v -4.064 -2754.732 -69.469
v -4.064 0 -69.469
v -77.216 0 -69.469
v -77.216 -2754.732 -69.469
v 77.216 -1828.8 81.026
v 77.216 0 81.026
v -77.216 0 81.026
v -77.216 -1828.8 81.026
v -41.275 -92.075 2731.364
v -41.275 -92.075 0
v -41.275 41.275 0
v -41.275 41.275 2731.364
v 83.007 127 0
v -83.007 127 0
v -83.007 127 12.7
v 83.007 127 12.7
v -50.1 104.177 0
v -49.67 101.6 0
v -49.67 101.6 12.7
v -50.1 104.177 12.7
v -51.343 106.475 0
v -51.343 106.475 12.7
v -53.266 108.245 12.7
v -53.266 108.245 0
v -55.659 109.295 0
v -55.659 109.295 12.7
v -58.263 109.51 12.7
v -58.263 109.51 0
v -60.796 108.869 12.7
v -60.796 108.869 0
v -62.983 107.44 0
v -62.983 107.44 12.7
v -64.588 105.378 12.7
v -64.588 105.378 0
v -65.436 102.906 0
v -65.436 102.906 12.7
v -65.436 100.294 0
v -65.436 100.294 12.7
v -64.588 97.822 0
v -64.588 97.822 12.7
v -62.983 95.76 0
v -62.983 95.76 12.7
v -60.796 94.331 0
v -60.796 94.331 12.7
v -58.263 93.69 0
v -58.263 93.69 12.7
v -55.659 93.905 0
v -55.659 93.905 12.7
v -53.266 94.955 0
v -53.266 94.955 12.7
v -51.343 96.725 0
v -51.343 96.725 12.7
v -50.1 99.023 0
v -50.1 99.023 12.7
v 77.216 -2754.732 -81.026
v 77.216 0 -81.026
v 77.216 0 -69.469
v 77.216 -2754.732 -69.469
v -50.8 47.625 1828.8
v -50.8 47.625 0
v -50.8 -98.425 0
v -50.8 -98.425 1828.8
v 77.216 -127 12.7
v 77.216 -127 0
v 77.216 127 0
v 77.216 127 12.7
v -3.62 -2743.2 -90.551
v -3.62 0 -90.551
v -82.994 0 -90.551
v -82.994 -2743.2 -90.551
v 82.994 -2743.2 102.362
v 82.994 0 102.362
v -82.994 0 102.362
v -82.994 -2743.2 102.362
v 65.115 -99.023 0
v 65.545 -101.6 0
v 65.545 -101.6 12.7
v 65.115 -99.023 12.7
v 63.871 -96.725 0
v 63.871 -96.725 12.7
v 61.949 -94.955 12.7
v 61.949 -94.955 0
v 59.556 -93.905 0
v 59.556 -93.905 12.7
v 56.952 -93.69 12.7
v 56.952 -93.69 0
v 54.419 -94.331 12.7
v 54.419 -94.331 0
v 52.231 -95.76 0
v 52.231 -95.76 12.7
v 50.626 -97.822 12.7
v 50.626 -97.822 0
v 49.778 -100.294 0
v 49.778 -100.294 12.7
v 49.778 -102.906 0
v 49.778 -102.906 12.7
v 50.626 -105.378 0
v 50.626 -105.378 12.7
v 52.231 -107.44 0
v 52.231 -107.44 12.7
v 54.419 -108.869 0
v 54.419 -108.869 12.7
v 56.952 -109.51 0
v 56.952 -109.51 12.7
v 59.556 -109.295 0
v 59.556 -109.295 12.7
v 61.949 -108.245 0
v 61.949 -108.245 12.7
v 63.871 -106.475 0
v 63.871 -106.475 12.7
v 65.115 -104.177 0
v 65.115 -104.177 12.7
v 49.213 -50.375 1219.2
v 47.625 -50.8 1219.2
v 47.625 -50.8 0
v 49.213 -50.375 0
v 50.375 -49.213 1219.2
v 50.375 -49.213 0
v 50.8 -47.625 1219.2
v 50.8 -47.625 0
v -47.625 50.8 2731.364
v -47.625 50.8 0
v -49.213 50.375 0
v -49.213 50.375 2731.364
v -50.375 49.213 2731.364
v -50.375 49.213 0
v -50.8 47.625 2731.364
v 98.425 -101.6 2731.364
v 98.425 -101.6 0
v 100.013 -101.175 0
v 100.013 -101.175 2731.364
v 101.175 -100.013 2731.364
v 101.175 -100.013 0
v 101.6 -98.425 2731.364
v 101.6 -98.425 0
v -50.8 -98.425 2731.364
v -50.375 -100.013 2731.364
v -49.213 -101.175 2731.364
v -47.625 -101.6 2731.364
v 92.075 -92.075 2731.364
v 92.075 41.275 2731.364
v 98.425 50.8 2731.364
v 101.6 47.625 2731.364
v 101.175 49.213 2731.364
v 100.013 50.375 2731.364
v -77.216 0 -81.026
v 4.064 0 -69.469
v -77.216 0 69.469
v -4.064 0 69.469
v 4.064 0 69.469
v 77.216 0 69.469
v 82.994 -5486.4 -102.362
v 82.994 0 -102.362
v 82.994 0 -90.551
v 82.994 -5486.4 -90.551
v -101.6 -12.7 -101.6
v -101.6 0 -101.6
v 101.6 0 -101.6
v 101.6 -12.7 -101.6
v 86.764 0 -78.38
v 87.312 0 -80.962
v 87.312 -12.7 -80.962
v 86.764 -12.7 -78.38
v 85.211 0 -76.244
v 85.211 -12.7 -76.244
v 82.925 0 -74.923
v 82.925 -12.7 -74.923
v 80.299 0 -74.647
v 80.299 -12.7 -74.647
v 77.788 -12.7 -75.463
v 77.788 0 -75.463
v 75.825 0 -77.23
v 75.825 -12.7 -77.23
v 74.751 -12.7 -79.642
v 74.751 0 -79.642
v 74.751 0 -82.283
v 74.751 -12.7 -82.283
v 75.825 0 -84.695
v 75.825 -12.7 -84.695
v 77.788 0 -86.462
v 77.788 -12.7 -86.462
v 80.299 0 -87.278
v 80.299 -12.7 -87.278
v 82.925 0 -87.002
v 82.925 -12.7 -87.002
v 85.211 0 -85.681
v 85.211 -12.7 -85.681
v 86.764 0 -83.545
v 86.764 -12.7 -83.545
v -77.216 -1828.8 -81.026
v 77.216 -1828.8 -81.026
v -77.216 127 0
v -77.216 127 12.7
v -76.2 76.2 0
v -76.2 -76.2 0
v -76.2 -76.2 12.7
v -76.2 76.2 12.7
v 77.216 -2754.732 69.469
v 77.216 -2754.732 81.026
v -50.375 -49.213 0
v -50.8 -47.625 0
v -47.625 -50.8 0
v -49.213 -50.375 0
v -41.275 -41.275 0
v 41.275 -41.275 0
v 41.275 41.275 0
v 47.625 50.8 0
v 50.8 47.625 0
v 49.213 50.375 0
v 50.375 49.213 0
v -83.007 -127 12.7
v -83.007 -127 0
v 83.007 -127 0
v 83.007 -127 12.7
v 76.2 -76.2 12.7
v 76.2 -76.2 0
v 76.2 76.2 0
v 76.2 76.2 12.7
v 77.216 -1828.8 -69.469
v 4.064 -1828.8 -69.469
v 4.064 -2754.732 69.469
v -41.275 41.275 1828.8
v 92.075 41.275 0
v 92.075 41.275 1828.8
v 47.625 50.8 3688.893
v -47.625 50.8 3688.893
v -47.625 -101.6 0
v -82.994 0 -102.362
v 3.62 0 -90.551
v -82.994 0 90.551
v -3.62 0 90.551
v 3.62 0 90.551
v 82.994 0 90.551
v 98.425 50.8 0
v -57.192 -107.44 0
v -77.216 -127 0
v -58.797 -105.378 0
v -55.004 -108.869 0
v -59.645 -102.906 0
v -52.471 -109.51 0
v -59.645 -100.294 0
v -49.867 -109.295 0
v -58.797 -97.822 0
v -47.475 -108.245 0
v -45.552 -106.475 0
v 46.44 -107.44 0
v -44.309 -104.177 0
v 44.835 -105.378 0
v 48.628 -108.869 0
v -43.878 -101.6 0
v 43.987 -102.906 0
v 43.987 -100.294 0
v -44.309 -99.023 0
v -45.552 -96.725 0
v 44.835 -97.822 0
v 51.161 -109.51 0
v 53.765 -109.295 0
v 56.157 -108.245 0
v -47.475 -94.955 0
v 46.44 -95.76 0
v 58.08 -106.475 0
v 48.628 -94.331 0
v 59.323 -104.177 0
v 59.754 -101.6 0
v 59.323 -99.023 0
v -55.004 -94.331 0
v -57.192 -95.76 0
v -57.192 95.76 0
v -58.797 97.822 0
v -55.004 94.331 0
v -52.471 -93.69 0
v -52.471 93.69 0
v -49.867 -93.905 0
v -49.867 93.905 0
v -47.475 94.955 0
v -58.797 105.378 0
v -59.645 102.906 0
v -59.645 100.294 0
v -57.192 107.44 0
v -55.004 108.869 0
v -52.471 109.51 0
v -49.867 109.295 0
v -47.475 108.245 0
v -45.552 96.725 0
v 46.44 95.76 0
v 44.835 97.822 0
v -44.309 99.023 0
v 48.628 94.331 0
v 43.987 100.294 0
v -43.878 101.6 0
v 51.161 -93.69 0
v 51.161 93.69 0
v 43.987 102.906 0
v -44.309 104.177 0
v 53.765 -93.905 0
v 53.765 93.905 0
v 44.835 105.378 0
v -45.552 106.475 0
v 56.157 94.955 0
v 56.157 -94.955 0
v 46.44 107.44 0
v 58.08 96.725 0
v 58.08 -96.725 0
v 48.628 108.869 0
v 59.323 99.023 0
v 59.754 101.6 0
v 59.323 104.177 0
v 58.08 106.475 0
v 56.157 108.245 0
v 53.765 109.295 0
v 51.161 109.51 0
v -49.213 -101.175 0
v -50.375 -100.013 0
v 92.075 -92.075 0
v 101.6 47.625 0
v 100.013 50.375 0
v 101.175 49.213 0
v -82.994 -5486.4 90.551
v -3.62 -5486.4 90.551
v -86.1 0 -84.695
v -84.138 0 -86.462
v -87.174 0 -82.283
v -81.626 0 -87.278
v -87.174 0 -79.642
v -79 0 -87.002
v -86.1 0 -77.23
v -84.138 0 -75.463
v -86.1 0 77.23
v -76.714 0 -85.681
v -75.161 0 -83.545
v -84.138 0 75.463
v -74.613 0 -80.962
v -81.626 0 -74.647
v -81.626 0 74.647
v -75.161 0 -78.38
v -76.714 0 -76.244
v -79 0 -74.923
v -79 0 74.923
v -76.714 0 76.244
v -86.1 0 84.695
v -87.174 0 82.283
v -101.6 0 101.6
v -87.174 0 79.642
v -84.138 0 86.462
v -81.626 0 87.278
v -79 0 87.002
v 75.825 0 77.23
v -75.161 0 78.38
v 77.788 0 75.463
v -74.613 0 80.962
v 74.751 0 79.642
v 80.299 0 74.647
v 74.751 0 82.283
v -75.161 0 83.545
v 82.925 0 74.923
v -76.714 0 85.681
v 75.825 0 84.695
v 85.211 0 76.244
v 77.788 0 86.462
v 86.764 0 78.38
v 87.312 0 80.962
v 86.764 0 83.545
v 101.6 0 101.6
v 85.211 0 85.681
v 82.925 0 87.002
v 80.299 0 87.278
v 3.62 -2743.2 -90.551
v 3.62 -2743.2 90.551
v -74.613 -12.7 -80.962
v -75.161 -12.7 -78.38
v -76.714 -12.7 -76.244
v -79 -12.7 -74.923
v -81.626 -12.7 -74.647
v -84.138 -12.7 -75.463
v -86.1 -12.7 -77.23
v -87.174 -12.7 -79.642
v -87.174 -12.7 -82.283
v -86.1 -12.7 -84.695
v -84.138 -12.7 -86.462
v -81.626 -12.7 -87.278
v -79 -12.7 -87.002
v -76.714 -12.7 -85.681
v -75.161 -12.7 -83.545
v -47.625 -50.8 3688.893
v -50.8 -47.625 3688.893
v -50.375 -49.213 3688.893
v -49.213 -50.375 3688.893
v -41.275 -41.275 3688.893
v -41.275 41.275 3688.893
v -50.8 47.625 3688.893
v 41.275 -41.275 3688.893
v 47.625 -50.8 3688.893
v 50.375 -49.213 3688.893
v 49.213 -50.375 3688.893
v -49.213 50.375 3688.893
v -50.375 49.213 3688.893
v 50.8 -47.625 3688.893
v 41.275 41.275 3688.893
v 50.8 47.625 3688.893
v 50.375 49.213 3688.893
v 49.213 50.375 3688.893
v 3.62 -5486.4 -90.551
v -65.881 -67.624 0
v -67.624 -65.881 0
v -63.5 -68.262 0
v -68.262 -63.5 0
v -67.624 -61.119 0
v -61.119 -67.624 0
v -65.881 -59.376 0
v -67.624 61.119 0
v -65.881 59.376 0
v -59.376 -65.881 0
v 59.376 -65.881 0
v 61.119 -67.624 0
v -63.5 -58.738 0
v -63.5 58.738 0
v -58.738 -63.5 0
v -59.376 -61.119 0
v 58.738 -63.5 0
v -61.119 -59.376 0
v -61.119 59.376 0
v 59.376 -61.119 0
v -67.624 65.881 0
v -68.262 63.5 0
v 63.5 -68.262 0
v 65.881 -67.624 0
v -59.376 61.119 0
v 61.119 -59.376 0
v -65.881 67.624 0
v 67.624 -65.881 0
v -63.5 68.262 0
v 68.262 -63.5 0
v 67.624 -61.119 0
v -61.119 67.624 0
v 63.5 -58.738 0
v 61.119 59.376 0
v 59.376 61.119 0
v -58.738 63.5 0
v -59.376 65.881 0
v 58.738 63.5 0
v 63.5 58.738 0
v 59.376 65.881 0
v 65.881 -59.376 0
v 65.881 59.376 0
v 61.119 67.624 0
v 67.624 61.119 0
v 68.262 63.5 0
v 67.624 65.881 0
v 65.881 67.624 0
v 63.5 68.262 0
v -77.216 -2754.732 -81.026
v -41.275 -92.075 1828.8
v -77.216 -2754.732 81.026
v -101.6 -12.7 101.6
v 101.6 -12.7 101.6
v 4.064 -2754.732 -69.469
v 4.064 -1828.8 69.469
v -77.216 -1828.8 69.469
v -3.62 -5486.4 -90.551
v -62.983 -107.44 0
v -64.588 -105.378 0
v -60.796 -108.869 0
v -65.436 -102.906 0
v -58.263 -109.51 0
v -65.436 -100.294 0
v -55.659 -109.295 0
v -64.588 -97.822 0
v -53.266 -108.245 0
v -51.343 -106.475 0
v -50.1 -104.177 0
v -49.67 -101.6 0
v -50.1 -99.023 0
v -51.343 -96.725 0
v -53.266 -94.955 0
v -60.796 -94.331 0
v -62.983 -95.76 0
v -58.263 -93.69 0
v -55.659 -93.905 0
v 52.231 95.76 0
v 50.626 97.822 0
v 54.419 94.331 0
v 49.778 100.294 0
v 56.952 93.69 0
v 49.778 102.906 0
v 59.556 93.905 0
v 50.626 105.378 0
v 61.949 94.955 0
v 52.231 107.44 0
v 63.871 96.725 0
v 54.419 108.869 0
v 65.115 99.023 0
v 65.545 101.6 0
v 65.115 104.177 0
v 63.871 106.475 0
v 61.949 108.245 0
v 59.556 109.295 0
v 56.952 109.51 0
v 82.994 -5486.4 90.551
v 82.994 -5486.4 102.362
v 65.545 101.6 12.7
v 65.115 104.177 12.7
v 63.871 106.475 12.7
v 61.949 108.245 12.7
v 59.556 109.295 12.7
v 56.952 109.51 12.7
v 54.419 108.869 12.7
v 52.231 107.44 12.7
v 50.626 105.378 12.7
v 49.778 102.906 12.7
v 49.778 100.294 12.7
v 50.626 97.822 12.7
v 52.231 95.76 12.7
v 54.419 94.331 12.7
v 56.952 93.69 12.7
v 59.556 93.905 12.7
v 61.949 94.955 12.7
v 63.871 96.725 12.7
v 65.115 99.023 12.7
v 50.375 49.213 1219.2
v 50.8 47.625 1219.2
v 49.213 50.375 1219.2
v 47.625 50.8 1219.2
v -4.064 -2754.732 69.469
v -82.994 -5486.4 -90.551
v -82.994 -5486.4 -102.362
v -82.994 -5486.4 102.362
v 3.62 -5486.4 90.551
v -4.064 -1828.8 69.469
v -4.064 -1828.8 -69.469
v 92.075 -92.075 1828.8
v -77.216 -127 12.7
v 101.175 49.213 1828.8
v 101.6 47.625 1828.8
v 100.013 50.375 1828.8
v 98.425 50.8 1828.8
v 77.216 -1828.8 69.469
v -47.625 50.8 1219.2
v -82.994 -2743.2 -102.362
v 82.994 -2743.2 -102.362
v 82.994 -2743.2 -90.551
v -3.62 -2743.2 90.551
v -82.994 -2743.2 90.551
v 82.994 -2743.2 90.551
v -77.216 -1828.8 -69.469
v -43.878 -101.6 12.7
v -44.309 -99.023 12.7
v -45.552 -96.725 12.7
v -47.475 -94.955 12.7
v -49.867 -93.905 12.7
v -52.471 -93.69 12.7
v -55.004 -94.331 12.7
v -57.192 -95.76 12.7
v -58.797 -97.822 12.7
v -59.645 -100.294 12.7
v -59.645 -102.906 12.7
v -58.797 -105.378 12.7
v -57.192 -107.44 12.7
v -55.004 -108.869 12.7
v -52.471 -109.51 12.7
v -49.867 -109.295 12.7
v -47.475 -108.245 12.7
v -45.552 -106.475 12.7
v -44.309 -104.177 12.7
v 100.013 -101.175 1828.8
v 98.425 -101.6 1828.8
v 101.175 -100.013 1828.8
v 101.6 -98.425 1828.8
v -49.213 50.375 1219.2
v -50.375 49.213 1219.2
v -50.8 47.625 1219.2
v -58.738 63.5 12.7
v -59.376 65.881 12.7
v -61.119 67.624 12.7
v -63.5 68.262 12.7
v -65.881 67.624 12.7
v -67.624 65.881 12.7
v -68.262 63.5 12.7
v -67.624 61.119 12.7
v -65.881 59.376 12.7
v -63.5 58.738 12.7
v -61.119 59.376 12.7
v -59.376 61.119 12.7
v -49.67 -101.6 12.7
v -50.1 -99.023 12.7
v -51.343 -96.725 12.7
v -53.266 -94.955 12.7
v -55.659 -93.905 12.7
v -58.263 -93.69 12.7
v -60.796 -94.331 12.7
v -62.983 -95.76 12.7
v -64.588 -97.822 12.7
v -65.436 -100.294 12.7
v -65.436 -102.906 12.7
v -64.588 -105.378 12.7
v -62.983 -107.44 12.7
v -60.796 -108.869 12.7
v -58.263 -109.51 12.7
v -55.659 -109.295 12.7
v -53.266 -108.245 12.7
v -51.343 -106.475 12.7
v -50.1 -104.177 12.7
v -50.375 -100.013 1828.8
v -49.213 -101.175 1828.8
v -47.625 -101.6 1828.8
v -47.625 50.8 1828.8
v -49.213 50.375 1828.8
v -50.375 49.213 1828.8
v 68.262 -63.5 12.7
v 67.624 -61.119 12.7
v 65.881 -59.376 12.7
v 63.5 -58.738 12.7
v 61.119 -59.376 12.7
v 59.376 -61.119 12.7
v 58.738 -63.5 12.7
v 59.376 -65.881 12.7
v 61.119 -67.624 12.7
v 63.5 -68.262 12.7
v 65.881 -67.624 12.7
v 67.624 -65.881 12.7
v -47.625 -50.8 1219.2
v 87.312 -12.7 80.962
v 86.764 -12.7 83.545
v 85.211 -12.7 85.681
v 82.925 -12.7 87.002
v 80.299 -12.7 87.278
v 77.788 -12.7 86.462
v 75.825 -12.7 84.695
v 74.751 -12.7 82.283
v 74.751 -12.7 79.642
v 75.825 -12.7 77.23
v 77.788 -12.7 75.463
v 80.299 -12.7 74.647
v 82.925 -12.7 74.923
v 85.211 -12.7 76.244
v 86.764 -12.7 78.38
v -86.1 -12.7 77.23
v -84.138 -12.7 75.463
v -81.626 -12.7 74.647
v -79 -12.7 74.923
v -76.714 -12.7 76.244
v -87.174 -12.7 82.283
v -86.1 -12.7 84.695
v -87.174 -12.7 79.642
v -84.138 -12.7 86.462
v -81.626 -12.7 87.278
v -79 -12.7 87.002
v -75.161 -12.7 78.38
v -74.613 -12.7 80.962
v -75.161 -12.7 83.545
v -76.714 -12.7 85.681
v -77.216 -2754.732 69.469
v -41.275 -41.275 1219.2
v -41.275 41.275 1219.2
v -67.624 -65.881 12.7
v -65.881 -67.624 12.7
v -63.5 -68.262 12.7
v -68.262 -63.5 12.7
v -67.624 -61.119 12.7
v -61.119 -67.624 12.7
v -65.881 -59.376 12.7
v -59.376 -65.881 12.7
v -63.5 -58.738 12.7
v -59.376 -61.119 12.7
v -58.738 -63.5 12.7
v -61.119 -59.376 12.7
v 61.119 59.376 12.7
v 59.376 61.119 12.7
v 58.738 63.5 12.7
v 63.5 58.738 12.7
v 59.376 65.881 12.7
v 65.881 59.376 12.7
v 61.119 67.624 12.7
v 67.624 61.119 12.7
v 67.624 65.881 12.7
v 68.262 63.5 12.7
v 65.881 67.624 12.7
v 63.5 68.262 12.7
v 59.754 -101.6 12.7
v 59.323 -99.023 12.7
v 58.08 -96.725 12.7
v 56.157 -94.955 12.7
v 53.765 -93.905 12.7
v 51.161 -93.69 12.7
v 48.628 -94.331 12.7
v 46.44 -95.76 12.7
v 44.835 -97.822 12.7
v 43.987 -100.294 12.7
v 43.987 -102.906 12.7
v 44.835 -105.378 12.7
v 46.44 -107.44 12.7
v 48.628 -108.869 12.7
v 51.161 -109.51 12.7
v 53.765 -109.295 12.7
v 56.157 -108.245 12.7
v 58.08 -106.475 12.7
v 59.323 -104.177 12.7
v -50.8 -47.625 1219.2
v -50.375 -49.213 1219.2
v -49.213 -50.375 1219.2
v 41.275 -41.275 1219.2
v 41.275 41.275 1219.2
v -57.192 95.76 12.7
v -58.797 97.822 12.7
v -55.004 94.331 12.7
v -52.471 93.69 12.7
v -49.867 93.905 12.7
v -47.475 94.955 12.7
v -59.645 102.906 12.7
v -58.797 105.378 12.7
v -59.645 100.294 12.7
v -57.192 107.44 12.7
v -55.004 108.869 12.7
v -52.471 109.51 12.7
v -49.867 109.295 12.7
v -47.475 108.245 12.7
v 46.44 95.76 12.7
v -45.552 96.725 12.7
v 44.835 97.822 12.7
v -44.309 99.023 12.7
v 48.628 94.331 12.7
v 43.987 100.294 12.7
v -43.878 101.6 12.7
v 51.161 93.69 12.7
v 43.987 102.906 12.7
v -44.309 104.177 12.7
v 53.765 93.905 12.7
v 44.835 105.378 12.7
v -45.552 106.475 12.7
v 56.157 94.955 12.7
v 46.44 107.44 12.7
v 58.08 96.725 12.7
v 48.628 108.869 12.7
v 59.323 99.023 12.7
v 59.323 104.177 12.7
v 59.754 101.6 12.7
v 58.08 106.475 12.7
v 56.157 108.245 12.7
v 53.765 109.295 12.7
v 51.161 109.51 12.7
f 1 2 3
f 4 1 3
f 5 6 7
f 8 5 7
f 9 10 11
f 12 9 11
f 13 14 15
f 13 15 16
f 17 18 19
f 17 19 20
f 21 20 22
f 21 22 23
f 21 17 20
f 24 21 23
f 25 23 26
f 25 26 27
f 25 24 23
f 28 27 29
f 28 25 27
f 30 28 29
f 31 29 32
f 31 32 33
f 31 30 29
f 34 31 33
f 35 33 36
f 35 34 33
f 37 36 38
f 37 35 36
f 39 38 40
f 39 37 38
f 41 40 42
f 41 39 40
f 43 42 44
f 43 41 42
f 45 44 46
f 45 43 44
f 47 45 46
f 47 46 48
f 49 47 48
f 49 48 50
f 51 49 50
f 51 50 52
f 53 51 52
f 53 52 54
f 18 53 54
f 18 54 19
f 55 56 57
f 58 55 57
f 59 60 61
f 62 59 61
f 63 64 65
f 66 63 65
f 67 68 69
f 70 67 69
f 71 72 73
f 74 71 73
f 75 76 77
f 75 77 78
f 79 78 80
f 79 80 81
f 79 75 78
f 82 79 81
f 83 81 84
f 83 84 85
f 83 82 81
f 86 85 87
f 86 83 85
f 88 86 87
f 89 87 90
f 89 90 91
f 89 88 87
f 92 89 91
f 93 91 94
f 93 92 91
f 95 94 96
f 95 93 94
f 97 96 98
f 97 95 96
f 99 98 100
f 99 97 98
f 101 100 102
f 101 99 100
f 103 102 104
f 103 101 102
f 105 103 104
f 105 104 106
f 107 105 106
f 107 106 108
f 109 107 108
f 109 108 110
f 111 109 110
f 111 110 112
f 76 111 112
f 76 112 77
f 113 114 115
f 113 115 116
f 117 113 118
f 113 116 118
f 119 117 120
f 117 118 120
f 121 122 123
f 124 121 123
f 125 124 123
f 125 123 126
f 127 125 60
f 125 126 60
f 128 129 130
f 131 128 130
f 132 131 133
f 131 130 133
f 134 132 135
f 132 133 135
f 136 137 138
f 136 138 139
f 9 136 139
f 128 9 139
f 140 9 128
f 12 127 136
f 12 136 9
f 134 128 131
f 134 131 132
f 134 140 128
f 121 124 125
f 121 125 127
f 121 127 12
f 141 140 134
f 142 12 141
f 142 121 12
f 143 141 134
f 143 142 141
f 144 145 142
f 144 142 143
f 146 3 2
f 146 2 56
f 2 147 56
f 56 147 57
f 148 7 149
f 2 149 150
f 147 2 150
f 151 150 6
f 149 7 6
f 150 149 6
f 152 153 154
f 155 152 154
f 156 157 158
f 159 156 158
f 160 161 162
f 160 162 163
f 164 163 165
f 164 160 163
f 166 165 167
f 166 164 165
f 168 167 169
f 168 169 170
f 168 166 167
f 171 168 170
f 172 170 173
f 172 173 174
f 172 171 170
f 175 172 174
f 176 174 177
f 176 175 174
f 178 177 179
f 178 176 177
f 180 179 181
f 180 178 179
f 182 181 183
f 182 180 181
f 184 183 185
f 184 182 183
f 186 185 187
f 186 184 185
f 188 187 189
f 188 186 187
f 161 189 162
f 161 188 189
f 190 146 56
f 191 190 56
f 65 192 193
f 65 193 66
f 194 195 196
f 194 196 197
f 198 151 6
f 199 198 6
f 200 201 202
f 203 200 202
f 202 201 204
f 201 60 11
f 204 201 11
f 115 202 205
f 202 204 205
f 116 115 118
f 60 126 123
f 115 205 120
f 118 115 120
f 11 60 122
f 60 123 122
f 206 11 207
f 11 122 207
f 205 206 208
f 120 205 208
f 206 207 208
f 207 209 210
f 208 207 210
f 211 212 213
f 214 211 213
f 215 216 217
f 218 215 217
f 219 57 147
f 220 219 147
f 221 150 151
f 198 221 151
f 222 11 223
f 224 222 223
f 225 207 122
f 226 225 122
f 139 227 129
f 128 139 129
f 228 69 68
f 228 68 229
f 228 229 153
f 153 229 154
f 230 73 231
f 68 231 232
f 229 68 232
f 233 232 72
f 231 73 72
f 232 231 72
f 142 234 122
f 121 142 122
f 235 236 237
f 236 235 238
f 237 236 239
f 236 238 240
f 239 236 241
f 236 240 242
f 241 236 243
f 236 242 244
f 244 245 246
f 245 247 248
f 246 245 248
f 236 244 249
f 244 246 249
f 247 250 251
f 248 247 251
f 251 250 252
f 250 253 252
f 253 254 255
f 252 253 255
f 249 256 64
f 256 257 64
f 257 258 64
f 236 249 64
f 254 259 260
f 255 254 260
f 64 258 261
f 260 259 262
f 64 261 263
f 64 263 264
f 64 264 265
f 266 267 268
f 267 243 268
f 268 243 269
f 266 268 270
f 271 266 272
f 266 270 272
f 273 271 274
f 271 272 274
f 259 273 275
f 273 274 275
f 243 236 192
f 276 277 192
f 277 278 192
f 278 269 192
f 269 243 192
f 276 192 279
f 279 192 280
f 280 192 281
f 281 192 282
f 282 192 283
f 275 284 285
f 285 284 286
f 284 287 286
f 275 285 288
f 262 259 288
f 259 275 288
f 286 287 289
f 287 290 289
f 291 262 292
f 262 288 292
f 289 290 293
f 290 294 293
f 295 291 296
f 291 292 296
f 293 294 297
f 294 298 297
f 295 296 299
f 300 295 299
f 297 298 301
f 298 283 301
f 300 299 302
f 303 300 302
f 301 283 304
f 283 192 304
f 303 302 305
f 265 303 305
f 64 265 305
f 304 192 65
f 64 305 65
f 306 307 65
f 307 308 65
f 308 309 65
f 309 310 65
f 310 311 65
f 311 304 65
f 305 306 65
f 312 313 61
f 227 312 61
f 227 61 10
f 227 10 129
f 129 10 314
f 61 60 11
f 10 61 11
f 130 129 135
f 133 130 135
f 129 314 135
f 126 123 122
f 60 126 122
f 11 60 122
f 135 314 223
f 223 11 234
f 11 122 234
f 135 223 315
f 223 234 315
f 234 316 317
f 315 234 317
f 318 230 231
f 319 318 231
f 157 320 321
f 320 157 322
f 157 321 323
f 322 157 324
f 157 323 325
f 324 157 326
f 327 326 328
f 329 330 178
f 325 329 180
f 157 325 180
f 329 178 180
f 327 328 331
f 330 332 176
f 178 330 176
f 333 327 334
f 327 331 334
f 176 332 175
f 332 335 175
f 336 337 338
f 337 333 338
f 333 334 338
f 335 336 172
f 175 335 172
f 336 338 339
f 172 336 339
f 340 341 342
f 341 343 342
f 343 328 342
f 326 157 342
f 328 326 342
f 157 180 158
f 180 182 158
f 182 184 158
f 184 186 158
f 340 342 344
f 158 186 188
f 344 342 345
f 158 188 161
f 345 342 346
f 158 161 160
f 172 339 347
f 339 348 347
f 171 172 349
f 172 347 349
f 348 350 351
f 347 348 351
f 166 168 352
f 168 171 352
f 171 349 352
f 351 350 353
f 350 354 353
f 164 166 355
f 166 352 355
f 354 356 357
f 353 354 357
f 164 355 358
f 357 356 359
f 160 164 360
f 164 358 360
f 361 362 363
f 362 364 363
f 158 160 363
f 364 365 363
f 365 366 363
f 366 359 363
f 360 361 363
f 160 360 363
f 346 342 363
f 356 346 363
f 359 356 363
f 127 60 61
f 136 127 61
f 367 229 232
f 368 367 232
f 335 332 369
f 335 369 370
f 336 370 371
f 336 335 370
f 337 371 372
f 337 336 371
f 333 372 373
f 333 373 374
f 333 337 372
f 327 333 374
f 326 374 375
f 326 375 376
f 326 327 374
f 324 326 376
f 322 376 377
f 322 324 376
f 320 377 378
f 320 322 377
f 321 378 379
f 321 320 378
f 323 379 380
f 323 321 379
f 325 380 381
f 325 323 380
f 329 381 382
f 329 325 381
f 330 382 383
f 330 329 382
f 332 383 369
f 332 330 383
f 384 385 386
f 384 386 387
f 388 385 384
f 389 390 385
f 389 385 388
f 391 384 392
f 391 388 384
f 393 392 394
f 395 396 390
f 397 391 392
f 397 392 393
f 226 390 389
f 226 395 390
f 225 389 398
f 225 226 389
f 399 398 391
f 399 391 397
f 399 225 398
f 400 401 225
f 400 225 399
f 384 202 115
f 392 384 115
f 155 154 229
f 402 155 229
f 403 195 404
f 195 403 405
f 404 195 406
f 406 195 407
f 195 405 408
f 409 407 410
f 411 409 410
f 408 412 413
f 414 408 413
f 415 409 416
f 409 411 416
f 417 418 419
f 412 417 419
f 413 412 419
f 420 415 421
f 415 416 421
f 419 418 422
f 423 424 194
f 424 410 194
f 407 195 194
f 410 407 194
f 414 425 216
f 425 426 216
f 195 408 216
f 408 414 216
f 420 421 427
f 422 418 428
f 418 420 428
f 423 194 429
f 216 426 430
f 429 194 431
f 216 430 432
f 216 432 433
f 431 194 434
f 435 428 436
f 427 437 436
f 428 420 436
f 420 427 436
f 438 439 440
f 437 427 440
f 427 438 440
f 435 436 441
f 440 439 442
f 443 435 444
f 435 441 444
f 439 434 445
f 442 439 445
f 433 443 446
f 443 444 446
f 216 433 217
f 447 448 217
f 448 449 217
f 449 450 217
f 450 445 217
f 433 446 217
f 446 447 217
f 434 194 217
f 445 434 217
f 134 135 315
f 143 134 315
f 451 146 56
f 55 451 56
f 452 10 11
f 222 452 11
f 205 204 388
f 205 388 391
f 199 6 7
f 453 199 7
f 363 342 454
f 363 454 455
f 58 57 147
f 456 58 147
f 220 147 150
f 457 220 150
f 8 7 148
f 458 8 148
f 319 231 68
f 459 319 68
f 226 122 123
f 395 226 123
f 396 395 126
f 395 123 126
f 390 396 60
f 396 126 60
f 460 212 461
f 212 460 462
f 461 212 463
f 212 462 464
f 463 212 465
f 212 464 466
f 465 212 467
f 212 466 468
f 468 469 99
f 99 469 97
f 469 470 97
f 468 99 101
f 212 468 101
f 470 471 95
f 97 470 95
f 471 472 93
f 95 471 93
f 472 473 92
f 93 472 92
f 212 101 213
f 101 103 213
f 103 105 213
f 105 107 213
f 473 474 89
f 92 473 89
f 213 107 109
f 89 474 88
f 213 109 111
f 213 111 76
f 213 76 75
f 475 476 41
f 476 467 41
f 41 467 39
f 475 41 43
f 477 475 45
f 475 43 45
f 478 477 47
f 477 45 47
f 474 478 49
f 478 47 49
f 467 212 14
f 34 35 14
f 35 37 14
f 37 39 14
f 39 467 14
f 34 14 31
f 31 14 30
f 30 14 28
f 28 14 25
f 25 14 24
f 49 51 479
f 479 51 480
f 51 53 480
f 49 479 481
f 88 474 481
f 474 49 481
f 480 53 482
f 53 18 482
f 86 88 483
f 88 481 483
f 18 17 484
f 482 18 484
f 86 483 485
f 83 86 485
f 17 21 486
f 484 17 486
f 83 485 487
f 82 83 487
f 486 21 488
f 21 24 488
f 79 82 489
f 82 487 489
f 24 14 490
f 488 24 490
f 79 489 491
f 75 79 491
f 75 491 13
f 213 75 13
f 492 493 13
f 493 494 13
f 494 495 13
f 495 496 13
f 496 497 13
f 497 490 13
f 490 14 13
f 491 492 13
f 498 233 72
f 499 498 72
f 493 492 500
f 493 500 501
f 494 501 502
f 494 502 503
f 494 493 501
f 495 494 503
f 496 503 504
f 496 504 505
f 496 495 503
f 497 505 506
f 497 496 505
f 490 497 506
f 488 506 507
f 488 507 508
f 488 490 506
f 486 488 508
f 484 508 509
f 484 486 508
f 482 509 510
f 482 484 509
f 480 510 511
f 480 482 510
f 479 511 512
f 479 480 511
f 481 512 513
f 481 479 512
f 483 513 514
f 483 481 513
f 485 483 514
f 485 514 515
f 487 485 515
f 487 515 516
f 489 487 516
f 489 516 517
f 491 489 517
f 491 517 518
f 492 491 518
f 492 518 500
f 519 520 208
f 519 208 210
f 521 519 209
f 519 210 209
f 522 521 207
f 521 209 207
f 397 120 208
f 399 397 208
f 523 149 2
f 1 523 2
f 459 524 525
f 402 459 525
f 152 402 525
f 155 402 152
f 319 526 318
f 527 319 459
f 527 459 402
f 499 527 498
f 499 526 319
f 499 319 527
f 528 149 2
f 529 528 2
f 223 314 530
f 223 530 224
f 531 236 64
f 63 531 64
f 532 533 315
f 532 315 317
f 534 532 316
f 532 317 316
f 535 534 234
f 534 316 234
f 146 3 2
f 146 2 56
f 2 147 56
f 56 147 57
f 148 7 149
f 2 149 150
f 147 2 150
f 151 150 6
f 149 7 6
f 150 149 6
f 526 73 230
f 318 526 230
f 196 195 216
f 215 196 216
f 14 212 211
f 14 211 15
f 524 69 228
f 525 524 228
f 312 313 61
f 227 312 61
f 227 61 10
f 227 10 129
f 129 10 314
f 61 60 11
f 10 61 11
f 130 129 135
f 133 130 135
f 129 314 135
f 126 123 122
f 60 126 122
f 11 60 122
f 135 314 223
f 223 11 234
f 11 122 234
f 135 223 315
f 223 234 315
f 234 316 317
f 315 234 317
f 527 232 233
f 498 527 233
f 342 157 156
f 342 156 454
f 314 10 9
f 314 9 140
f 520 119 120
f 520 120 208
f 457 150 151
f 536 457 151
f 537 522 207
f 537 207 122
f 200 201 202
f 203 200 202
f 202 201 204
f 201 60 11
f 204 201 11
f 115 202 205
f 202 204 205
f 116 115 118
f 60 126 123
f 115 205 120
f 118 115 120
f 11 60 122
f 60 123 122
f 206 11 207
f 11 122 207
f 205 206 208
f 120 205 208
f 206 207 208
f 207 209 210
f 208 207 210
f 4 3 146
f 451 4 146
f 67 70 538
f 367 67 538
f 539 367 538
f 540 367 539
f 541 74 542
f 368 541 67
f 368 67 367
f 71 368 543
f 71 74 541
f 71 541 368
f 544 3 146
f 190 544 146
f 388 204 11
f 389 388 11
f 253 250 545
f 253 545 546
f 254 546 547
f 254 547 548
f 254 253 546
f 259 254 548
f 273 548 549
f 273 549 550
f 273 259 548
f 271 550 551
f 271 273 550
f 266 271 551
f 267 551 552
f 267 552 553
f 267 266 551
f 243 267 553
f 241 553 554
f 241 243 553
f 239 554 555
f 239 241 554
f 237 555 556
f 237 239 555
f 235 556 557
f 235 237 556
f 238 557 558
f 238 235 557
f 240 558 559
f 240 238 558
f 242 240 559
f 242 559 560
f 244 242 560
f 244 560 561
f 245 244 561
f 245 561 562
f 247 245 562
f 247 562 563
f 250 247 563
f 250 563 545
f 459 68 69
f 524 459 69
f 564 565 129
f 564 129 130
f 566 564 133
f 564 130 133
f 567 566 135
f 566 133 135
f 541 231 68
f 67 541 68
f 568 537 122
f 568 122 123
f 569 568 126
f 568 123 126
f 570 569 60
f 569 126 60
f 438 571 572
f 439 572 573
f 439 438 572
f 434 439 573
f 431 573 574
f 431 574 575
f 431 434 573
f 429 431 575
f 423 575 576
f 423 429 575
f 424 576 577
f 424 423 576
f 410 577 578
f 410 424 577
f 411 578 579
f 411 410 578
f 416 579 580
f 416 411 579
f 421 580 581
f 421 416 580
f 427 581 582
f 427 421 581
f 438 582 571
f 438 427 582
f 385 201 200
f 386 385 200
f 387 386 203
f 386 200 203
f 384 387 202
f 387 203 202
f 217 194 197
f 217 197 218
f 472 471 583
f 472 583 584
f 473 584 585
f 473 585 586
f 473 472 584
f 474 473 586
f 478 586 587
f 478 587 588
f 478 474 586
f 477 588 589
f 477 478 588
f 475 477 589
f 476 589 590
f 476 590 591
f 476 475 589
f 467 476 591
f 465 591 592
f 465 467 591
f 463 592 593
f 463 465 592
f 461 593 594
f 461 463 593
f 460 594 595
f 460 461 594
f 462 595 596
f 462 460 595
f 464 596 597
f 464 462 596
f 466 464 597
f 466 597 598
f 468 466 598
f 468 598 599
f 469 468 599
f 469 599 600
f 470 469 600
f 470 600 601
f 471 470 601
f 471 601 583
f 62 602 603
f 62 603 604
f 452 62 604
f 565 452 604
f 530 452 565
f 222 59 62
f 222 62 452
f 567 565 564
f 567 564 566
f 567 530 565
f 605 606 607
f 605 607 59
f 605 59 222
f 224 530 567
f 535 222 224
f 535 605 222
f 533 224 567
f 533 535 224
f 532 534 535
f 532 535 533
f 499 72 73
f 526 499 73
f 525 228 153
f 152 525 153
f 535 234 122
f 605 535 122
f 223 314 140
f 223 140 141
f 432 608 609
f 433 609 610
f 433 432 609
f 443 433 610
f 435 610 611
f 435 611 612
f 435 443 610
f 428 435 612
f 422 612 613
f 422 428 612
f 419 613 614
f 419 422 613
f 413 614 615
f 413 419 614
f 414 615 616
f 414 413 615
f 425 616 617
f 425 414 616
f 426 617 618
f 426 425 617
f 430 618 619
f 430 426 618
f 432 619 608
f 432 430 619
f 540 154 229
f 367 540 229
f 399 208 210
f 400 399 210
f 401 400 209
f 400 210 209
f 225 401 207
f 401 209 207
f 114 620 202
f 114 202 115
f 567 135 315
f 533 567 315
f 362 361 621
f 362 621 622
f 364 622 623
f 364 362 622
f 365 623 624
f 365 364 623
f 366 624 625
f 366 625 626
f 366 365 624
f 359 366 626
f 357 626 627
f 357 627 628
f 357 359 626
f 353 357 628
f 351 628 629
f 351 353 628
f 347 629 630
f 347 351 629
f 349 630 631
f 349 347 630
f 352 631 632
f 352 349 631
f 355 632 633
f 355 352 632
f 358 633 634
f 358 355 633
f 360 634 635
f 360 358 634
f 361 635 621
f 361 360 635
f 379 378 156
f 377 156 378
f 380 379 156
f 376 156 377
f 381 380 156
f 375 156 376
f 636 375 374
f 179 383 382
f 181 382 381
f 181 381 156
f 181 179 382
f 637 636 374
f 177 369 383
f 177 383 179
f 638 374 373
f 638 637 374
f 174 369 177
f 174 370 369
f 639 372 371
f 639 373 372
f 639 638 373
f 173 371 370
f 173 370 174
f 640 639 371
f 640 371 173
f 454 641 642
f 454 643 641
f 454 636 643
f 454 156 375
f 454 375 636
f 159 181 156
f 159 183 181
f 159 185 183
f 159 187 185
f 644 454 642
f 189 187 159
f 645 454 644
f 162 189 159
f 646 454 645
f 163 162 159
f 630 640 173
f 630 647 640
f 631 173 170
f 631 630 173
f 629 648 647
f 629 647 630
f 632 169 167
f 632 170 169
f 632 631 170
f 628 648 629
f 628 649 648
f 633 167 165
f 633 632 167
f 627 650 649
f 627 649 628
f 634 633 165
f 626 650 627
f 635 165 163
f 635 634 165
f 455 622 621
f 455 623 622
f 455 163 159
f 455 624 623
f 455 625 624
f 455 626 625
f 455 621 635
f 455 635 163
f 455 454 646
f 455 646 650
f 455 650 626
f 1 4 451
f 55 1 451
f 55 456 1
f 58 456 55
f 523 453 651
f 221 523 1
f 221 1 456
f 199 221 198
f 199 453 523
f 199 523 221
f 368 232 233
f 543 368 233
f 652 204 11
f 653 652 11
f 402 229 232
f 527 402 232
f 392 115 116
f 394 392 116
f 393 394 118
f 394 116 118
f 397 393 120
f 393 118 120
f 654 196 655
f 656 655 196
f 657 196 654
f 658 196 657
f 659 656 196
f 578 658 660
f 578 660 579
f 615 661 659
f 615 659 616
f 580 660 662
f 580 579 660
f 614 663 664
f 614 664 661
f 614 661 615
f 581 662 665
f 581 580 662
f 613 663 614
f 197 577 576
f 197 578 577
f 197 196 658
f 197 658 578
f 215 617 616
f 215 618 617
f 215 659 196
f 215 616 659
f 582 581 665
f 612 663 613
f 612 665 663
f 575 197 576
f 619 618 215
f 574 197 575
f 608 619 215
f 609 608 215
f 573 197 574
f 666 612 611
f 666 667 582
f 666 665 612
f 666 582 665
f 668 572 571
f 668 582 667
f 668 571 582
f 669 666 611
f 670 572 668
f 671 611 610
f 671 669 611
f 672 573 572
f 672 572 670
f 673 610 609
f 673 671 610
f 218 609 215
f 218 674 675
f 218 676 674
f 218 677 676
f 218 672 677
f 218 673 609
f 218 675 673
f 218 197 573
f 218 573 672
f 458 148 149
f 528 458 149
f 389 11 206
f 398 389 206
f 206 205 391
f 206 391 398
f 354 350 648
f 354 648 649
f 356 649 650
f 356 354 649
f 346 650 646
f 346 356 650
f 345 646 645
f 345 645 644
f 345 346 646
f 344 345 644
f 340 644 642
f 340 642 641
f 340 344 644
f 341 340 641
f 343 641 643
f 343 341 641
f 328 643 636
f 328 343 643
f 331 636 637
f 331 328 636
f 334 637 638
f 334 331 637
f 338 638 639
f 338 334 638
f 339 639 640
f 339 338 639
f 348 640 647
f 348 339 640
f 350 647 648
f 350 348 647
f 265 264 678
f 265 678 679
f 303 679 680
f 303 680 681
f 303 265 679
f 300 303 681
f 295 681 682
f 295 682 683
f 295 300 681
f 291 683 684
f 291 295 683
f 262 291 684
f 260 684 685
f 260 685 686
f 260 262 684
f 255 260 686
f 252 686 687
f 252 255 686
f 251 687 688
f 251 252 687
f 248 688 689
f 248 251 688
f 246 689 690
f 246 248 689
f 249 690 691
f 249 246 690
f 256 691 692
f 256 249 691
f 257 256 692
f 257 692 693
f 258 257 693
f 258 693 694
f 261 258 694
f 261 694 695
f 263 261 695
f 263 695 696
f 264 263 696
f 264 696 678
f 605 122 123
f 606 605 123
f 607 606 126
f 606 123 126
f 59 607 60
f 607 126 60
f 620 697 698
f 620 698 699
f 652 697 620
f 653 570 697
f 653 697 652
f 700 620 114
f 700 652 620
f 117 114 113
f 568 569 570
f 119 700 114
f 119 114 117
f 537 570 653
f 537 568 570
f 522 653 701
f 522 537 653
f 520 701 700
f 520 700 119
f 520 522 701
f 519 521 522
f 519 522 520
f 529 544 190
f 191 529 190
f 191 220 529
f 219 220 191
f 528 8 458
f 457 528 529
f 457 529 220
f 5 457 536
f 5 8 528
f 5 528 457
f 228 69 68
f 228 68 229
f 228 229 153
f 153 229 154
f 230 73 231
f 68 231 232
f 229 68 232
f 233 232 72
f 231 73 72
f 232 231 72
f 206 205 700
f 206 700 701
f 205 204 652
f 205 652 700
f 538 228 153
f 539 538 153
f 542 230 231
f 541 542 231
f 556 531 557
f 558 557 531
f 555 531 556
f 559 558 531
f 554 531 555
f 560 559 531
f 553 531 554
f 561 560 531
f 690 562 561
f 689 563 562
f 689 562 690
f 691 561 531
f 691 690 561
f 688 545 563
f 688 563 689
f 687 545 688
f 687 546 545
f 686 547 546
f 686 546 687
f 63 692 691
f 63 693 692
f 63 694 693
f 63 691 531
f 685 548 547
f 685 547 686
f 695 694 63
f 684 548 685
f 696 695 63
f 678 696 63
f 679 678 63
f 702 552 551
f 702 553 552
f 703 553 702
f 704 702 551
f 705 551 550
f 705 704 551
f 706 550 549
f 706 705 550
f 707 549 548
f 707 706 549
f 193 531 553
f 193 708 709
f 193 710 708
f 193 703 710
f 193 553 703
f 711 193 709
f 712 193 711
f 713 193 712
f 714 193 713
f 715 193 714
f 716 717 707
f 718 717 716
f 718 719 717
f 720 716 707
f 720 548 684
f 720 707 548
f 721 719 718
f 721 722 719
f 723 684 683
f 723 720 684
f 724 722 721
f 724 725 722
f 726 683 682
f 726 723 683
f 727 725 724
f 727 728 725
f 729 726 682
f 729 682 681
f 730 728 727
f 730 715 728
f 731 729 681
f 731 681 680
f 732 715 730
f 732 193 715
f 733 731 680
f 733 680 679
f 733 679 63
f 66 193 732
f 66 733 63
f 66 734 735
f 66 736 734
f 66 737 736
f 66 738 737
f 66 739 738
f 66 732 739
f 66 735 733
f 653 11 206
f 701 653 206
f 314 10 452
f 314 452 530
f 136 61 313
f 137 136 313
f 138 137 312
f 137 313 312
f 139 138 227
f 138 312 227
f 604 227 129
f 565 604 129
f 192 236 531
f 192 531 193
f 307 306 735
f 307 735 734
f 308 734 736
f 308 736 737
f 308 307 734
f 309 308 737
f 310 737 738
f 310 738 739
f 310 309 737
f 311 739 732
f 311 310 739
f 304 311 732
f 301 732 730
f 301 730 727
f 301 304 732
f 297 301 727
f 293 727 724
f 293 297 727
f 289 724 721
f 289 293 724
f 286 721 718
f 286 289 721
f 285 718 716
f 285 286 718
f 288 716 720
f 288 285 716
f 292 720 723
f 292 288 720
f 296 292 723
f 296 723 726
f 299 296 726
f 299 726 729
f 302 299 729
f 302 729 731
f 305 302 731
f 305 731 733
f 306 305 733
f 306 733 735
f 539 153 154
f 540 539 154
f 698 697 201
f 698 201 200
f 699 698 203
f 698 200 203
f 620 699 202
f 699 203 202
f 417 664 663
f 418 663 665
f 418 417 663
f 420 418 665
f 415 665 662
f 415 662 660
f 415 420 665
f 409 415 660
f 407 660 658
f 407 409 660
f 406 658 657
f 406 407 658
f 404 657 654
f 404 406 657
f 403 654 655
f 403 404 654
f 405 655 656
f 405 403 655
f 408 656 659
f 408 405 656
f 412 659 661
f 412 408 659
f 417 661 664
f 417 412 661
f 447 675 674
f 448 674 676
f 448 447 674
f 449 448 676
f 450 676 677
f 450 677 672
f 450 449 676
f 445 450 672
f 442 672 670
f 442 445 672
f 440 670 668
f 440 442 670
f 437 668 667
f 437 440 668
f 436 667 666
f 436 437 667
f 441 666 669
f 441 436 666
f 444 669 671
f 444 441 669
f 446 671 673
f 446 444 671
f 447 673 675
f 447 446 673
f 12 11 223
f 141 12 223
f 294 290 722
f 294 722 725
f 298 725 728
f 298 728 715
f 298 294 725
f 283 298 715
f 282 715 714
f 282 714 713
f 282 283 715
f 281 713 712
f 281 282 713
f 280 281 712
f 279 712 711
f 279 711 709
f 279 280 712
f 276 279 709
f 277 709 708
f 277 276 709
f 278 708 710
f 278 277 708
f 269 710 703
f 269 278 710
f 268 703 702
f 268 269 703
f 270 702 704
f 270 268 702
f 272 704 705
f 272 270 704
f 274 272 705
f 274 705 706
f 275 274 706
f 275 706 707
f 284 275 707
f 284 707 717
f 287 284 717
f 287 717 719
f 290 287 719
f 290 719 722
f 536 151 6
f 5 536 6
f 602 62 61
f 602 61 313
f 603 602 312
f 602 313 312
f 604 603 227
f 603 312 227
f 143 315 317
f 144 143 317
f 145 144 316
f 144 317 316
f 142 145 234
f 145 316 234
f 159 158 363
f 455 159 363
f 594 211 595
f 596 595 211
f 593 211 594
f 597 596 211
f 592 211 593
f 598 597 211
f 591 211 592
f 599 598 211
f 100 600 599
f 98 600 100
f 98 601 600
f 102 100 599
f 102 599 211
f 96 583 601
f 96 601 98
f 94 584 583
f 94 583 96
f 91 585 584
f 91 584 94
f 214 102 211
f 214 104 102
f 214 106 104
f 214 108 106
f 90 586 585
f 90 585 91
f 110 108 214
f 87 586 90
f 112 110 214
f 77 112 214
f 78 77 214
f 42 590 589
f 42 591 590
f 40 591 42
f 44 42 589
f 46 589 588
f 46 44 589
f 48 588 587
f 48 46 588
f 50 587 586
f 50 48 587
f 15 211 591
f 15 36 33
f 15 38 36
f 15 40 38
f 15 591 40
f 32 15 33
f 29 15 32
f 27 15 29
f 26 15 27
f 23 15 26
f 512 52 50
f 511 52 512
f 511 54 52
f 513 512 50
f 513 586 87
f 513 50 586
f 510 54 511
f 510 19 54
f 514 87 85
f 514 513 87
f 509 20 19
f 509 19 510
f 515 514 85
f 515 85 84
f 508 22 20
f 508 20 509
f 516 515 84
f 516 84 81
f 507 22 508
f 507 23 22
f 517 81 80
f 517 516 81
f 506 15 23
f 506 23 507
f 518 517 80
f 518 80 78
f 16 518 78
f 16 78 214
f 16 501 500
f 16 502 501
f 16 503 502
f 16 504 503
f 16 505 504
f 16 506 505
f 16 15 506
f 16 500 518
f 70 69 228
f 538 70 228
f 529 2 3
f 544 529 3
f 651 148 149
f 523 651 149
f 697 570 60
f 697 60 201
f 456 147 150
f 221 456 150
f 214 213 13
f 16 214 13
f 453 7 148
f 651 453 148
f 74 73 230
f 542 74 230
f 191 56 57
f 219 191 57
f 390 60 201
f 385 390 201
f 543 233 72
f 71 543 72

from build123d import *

# Parameters (mm, degrees)
F3_DEPTH  = 5486.4
F4_DEPTH  = 2743.2
F6_DEPTH  = 2754.7316
F7_DEPTH  = 1828.8
F8_W      = 82.55
F8_H      = 82.55
F9_DEPTH  = 1219.2
F10_W     = 133.35
F10_H     = 133.35
F11_DEPTH = 1828.8
F12_DEPTH = 3688.8928
F13_W     = 166.0144
F13_H     = 254
F13_R     = 7.9375
F14_DEPTH = 12.7
F15_W     = 152.4
F15_H     = 152.4
F15_R     = 4.7625
F16_DEPTH = 12.7
F17_W     = 154.432
F17_H     = 254
F17_R     = 7.9375
F18_DEPTH = 12.7
F19_W     = 203.2
F19_H     = 203.2
F19_R     = 6.35
F20_DEPTH = 12.7
F21_DEPTH = 2731.3636


# Not quite as in the source:
# - a variable given as a bare number and used for a length is read in inches; the dataset says mm whatever the document's units were


with BuildPart() as f3:
    # F2 (on Front) → F3 (new body)
    with BuildSketch(Plane.XZ):
        Polygon((-3.6195, 90.551), (-3.6195, 0), (-3.6195, -90.551), (-82.9945, -90.551), (-82.9945, -102.362), (0, -102.362), (82.9945, -102.362), (82.9945, -90.551), (3.6195, -90.551), (3.6195, 0), (3.6195, 90.551), (82.9945, 90.551), (82.9945, 102.362), (0, 102.362), (-82.9945, 102.362), (-82.9945, 90.551), align=None)
    extrude(amount=F3_DEPTH)


with BuildPart() as f4:
    # F2 (on Front) → F4 (new body)
    with BuildSketch(Plane.XZ):
        Polygon((-3.6195, 90.551), (-3.6195, 0), (-3.6195, -90.551), (-82.9945, -90.551), (-82.9945, -102.362), (0, -102.362), (82.9945, -102.362), (82.9945, -90.551), (3.6195, -90.551), (3.6195, 0), (3.6195, 90.551), (82.9945, 90.551), (82.9945, 102.362), (0, 102.362), (-82.9945, 102.362), (-82.9945, 90.551), align=None)
    extrude(amount=F4_DEPTH)


with BuildPart() as f6:
    # F5 (on Front) → F6 (new body)
    with BuildSketch(Plane.XZ):
        Polygon((-4.064, 69.469), (-4.064, 0), (-4.064, -69.469), (-77.216, -69.469), (-77.216, -81.026), (0, -81.026), (77.216, -81.026), (77.216, -69.469), (4.064, -69.469), (4.064, 0), (4.064, 69.469), (77.216, 69.469), (77.216, 81.026), (0, 81.026), (-77.216, 81.026), (-77.216, 69.469), align=None)
    extrude(amount=F6_DEPTH)


with BuildPart() as f7:
    # F5 (on Front) → F7 (new body)
    with BuildSketch(Plane.XZ):
        Polygon((-4.064, 69.469), (-4.064, 0), (-4.064, -69.469), (-77.216, -69.469), (-77.216, -81.026), (0, -81.026), (77.216, -81.026), (77.216, -69.469), (4.064, -69.469), (4.064, 0), (4.064, 69.469), (77.216, 69.469), (77.216, 81.026), (0, 81.026), (-77.216, 81.026), (-77.216, 69.469), align=None)
    extrude(amount=F7_DEPTH)


with BuildPart() as f9:
    # F8 (on Top) → F9 (new body)
    with BuildSketch(Plane.XY):
        with BuildLine():
            Line((-47.625, -50.8), (47.625, -50.8))
            ThreePointArc((47.625, -50.8), (49.8700640303, -49.8700640303), (50.8, -47.625))
            Line((50.8, -47.625), (50.8, 47.625))
            ThreePointArc((50.8, 47.625), (49.8700640303, 49.8700640303), (47.625, 50.8))
            Line((47.625, 50.8), (-47.625, 50.8))
            ThreePointArc((-47.625, 50.8), (-49.8700640303, 49.8700640303), (-50.8, 47.625))
            Line((-50.8, 47.625), (-50.8, -47.625))
            ThreePointArc((-50.8, -47.625), (-49.8700640303, -49.8700640303), (-47.625, -50.8))
        make_face()
        Rectangle(F8_W, F8_H, mode=Mode.SUBTRACT)
    extrude(amount=F9_DEPTH)


with BuildPart() as f11:
    # F10 (on Top) → F11 (new body)
    with BuildSketch(Plane.XY):
        with BuildLine():
            Line((-47.625, -101.6), (98.425, -101.6))
            ThreePointArc((98.425, -101.6), (100.6700640303, -100.6700640303), (101.6, -98.425))
            Line((101.6, -98.425), (101.6, 47.625))
            ThreePointArc((101.6, 47.625), (100.6700640303, 49.8700640303), (98.425, 50.8))
            Line((98.425, 50.8), (-47.625, 50.8))
            ThreePointArc((-47.625, 50.8), (-49.8700640303, 49.8700640303), (-50.8, 47.625))
            Line((-50.8, 47.625), (-50.8, -98.425))
            ThreePointArc((-50.8, -98.425), (-49.8700640303, -100.6700640303), (-47.625, -101.6))
        make_face()
        with Locations((25.4, -25.4)):
            Rectangle(F10_W, F10_H, mode=Mode.SUBTRACT)
    extrude(amount=F11_DEPTH)


with BuildPart() as f12:
    # F8 (on Top) → F12 (new body)
    with BuildSketch(Plane.XY):
        with BuildLine():
            Line((-47.625, -50.8), (47.625, -50.8))
            ThreePointArc((47.625, -50.8), (49.8700640303, -49.8700640303), (50.8, -47.625))
            Line((50.8, -47.625), (50.8, 47.625))
            ThreePointArc((50.8, 47.625), (49.8700640303, 49.8700640303), (47.625, 50.8))
            Line((47.625, 50.8), (-47.625, 50.8))
            ThreePointArc((-47.625, 50.8), (-49.8700640303, 49.8700640303), (-50.8, 47.625))
            Line((-50.8, 47.625), (-50.8, -47.625))
            ThreePointArc((-50.8, -47.625), (-49.8700640303, -49.8700640303), (-47.625, -50.8))
        make_face()
        Rectangle(F8_W, F8_H, mode=Mode.SUBTRACT)
    extrude(amount=F12_DEPTH)


with BuildPart() as f14:
    # F13 (on Top) → F14 (new body)
    with BuildSketch(Plane.XY):
        Rectangle(F13_W, F13_H)
        with Locations((-57.6072, -101.6)):
            Circle(F13_R, mode=Mode.SUBTRACT)
        with Locations((57.6072, -101.6)):
            Circle(F13_R, mode=Mode.SUBTRACT)
        with Locations((-57.6072, 101.6)):
            Circle(F13_R, mode=Mode.SUBTRACT)
        with Locations((57.6072, 101.6)):
            Circle(F13_R, mode=Mode.SUBTRACT)
    extrude(amount=F14_DEPTH)


with BuildPart() as f16:
    # F15 (on Top) → F16 (new body)
    with BuildSketch(Plane.XY):
        Rectangle(F15_W, F15_H)
        with Locations((-63.5, -63.5)):
            Circle(F15_R, mode=Mode.SUBTRACT)
        with Locations((63.5, -63.5)):
            Circle(F15_R, mode=Mode.SUBTRACT)
        with Locations((-63.5, 63.5)):
            Circle(F15_R, mode=Mode.SUBTRACT)
        with Locations((63.5, 63.5)):
            Circle(F15_R, mode=Mode.SUBTRACT)
    extrude(amount=F16_DEPTH)


with BuildPart() as f18:
    # F17 (on Top) → F18 (new body)
    with BuildSketch(Plane.XY):
        Rectangle(F17_W, F17_H)
        with Locations((-51.816, -101.6)):
            Circle(F17_R, mode=Mode.SUBTRACT)
        with Locations((51.816, -101.6)):
            Circle(F17_R, mode=Mode.SUBTRACT)
        with Locations((-51.816, 101.6)):
            Circle(F17_R, mode=Mode.SUBTRACT)
        with Locations((51.816, 101.6)):
            Circle(F17_R, mode=Mode.SUBTRACT)
    extrude(amount=F18_DEPTH)


with BuildPart() as f20:
    # F19 (on Front) → F20 (new body)
    with BuildSketch(Plane.XZ):
        Rectangle(F19_W, F19_H)
        with Locations((-80.9625, -80.9625)):
            Circle(F19_R, mode=Mode.SUBTRACT)
        with Locations((80.9625, -80.9625)):
            Circle(F19_R, mode=Mode.SUBTRACT)
        with Locations((-80.9625, 80.9625)):
            Circle(F19_R, mode=Mode.SUBTRACT)
        with Locations((80.9625, 80.9625)):
            Circle(F19_R, mode=Mode.SUBTRACT)
    extrude(amount=F20_DEPTH)


with BuildPart() as f21:
    # F10 (on Top) → F21 (new body)
    with BuildSketch(Plane.XY):
        with BuildLine():
            Line((-47.625, -101.6), (98.425, -101.6))
            ThreePointArc((98.425, -101.6), (100.6700640303, -100.6700640303), (101.6, -98.425))
            Line((101.6, -98.425), (101.6, 47.625))
            ThreePointArc((101.6, 47.625), (100.6700640303, 49.8700640303), (98.425, 50.8))
            Line((98.425, 50.8), (-47.625, 50.8))
            ThreePointArc((-47.625, 50.8), (-49.8700640303, 49.8700640303), (-50.8, 47.625))
            Line((-50.8, 47.625), (-50.8, -98.425))
            ThreePointArc((-50.8, -98.425), (-49.8700640303, -100.6700640303), (-47.625, -101.6))
        make_face()
        with Locations((25.4, -25.4)):
            Rectangle(F10_W, F10_H, mode=Mode.SUBTRACT)
    extrude(amount=F21_DEPTH)


solid = Compound([f3.part, f4.part, f6.part, f7.part, f9.part, f11.part, f12.part, f14.part, f16.part, f18.part, f20.part, f21.part])
